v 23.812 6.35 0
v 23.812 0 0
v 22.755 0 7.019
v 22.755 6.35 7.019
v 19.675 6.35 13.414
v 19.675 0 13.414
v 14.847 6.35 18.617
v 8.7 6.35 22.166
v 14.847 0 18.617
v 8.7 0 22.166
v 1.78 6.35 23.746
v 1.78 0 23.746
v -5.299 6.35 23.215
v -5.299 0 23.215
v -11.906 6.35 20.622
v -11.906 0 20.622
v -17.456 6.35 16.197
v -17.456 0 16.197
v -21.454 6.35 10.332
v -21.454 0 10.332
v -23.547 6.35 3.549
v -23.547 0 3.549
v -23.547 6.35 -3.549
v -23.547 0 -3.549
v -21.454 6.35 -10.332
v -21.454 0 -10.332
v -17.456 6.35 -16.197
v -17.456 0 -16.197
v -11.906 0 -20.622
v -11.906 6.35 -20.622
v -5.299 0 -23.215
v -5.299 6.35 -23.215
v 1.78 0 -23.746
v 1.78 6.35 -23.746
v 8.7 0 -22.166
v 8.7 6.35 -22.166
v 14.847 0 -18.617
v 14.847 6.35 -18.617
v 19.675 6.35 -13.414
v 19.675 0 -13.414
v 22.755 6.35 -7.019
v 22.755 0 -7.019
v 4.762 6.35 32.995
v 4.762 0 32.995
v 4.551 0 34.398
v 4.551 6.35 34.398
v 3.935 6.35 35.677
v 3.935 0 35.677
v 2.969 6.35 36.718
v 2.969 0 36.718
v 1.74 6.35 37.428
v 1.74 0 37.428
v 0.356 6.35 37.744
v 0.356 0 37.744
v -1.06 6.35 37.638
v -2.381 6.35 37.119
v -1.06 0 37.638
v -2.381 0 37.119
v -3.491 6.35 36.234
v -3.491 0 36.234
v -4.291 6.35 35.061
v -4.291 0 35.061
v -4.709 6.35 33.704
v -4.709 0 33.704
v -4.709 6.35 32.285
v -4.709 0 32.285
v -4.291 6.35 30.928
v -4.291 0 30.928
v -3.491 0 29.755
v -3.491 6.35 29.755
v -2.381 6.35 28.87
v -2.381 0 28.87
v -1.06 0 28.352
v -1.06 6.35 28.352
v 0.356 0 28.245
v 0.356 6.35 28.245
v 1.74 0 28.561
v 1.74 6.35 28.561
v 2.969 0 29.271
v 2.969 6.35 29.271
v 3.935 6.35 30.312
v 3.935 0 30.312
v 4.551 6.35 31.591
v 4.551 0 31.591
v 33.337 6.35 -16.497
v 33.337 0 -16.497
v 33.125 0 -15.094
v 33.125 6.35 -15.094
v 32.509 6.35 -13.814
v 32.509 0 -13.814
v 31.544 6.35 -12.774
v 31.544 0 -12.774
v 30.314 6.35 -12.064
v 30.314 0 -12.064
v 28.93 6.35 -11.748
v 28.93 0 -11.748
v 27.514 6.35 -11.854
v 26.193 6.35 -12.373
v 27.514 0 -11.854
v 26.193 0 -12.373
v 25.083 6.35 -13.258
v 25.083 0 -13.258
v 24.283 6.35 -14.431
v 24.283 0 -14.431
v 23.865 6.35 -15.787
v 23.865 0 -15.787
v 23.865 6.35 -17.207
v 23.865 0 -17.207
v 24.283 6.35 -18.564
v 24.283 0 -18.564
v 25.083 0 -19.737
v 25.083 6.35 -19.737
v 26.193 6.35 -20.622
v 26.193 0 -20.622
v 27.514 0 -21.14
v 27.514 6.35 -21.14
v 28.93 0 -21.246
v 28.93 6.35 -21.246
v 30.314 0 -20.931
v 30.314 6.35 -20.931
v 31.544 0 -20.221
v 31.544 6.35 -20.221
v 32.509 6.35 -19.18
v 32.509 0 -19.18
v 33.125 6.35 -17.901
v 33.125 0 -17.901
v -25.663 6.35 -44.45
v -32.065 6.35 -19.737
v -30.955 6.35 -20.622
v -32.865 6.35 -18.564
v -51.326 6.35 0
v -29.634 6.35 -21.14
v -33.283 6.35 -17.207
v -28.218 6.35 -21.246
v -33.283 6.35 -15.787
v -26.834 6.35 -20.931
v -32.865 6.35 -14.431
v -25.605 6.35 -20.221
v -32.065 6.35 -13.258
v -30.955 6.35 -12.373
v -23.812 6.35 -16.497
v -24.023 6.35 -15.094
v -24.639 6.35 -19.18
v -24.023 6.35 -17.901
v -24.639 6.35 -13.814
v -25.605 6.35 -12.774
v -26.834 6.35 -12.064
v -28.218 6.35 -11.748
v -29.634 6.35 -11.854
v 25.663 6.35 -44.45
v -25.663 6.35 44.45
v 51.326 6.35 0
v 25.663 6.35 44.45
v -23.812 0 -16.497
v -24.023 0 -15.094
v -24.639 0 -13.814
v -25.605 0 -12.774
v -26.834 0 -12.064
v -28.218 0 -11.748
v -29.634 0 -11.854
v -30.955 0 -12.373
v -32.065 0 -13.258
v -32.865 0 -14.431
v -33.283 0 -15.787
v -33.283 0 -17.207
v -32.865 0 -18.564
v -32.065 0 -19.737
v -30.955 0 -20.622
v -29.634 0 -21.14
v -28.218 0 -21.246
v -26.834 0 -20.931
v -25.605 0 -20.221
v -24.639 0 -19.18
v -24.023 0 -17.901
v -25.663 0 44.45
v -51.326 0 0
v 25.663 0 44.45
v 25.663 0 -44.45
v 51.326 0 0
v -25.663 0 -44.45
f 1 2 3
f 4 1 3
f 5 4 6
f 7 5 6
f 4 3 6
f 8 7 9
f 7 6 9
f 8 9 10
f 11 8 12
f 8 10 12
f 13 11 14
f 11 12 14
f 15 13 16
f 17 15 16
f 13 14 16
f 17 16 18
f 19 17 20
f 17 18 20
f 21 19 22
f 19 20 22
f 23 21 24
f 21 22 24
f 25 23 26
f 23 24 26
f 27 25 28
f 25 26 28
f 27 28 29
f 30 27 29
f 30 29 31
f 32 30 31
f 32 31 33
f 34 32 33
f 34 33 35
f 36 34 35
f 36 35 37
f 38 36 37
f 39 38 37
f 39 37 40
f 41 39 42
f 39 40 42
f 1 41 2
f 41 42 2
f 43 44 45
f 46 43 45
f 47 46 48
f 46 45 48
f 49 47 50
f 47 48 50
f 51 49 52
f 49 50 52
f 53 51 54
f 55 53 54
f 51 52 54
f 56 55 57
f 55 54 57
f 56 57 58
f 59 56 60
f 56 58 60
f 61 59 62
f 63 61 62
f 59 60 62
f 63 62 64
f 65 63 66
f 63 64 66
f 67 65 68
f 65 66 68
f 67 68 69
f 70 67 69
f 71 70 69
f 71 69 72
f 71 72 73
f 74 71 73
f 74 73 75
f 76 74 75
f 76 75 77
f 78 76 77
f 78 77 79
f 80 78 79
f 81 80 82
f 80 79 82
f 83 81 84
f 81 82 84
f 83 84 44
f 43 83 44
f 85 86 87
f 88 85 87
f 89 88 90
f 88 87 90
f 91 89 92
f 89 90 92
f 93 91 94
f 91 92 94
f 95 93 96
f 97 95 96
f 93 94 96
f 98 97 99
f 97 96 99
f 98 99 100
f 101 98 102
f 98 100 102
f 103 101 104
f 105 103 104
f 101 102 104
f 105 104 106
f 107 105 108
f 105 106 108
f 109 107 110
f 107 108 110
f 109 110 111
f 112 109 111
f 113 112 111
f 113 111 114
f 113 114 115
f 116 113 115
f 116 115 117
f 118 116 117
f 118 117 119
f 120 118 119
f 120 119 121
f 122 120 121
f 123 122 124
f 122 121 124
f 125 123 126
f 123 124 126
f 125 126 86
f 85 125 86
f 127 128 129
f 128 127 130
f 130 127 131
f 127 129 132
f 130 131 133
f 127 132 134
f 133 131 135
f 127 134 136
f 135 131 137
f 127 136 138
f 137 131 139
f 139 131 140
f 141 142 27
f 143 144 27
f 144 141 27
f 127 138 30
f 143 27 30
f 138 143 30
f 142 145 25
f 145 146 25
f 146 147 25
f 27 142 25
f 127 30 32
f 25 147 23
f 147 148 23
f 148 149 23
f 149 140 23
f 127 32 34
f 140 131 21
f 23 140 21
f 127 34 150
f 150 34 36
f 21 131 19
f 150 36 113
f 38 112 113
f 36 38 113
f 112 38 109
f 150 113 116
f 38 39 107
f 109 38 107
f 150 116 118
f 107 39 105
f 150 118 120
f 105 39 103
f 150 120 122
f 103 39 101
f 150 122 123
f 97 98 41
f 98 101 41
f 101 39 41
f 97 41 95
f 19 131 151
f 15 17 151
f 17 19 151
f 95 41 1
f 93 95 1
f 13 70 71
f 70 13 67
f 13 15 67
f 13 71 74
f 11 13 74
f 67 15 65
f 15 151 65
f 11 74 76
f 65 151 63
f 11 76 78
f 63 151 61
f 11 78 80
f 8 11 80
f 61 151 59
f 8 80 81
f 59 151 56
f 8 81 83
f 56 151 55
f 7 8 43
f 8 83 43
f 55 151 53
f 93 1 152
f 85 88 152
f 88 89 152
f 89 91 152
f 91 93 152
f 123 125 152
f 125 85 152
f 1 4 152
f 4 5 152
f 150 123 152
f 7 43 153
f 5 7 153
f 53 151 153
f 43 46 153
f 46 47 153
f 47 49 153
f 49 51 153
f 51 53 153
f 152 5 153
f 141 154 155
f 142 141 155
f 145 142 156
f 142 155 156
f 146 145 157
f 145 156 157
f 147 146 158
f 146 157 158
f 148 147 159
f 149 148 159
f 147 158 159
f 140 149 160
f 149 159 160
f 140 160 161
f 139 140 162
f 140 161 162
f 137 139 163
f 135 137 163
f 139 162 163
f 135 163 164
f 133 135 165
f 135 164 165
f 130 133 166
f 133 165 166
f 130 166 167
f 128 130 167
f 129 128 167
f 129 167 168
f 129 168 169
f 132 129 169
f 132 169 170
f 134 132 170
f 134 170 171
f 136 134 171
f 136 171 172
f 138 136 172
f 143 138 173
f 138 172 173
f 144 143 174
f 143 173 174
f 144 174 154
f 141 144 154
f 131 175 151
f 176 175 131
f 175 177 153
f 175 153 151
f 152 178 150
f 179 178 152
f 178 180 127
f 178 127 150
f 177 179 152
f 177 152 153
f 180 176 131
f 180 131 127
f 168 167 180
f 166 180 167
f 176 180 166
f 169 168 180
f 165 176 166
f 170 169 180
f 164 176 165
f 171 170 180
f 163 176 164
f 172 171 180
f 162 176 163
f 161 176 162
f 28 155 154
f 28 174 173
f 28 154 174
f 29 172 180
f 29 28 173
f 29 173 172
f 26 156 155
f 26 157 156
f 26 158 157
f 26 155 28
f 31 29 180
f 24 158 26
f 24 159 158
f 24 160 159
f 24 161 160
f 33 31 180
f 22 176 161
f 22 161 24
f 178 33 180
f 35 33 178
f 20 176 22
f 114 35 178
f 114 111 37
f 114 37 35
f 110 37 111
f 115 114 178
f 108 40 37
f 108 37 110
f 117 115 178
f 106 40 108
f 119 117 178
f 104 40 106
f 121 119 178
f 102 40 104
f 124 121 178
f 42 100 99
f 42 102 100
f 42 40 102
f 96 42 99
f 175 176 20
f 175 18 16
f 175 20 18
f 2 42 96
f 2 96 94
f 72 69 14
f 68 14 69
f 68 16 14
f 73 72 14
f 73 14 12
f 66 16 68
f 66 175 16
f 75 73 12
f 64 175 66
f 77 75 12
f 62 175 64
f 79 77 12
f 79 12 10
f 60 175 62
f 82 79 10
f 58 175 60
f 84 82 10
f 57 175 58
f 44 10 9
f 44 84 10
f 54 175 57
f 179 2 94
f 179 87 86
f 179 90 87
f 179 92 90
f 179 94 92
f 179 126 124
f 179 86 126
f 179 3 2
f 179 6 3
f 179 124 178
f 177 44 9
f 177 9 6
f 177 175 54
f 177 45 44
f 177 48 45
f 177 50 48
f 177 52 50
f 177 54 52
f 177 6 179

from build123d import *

# Parameters (mm, degrees)
F0_R     = 4.7625
F0_R_2   = 23.8125
F1_DEPTH = 6.35


# Not quite as in the source:
# - the program builds the solid bodies; features that only make, move or delete a surface that nothing else refers to are left out


with BuildPart() as f1:
    # F0 (on Front) → F1 (new body)
    with BuildSketch(Plane.XZ):
        Polygon((-25.6632194655, 44.45), (-51.326438931, 0), (-25.6632194655, -44.45), (25.6632194655, -44.45), (51.326438931, 0), (25.6632194655, 44.45), align=None)
        with Locations((-28.5741617877, -16.4973)):
            Circle(F0_R, mode=Mode.SUBTRACT)
        with Locations((28.5741617877, -16.4973)):
            Circle(F0_R, mode=Mode.SUBTRACT)
        Circle(F0_R_2, mode=Mode.SUBTRACT)
        with Locations((0, 32.9946)):
            Circle(F0_R, mode=Mode.SUBTRACT)
    extrude(amount=-F1_DEPTH)


solid = f1.part
